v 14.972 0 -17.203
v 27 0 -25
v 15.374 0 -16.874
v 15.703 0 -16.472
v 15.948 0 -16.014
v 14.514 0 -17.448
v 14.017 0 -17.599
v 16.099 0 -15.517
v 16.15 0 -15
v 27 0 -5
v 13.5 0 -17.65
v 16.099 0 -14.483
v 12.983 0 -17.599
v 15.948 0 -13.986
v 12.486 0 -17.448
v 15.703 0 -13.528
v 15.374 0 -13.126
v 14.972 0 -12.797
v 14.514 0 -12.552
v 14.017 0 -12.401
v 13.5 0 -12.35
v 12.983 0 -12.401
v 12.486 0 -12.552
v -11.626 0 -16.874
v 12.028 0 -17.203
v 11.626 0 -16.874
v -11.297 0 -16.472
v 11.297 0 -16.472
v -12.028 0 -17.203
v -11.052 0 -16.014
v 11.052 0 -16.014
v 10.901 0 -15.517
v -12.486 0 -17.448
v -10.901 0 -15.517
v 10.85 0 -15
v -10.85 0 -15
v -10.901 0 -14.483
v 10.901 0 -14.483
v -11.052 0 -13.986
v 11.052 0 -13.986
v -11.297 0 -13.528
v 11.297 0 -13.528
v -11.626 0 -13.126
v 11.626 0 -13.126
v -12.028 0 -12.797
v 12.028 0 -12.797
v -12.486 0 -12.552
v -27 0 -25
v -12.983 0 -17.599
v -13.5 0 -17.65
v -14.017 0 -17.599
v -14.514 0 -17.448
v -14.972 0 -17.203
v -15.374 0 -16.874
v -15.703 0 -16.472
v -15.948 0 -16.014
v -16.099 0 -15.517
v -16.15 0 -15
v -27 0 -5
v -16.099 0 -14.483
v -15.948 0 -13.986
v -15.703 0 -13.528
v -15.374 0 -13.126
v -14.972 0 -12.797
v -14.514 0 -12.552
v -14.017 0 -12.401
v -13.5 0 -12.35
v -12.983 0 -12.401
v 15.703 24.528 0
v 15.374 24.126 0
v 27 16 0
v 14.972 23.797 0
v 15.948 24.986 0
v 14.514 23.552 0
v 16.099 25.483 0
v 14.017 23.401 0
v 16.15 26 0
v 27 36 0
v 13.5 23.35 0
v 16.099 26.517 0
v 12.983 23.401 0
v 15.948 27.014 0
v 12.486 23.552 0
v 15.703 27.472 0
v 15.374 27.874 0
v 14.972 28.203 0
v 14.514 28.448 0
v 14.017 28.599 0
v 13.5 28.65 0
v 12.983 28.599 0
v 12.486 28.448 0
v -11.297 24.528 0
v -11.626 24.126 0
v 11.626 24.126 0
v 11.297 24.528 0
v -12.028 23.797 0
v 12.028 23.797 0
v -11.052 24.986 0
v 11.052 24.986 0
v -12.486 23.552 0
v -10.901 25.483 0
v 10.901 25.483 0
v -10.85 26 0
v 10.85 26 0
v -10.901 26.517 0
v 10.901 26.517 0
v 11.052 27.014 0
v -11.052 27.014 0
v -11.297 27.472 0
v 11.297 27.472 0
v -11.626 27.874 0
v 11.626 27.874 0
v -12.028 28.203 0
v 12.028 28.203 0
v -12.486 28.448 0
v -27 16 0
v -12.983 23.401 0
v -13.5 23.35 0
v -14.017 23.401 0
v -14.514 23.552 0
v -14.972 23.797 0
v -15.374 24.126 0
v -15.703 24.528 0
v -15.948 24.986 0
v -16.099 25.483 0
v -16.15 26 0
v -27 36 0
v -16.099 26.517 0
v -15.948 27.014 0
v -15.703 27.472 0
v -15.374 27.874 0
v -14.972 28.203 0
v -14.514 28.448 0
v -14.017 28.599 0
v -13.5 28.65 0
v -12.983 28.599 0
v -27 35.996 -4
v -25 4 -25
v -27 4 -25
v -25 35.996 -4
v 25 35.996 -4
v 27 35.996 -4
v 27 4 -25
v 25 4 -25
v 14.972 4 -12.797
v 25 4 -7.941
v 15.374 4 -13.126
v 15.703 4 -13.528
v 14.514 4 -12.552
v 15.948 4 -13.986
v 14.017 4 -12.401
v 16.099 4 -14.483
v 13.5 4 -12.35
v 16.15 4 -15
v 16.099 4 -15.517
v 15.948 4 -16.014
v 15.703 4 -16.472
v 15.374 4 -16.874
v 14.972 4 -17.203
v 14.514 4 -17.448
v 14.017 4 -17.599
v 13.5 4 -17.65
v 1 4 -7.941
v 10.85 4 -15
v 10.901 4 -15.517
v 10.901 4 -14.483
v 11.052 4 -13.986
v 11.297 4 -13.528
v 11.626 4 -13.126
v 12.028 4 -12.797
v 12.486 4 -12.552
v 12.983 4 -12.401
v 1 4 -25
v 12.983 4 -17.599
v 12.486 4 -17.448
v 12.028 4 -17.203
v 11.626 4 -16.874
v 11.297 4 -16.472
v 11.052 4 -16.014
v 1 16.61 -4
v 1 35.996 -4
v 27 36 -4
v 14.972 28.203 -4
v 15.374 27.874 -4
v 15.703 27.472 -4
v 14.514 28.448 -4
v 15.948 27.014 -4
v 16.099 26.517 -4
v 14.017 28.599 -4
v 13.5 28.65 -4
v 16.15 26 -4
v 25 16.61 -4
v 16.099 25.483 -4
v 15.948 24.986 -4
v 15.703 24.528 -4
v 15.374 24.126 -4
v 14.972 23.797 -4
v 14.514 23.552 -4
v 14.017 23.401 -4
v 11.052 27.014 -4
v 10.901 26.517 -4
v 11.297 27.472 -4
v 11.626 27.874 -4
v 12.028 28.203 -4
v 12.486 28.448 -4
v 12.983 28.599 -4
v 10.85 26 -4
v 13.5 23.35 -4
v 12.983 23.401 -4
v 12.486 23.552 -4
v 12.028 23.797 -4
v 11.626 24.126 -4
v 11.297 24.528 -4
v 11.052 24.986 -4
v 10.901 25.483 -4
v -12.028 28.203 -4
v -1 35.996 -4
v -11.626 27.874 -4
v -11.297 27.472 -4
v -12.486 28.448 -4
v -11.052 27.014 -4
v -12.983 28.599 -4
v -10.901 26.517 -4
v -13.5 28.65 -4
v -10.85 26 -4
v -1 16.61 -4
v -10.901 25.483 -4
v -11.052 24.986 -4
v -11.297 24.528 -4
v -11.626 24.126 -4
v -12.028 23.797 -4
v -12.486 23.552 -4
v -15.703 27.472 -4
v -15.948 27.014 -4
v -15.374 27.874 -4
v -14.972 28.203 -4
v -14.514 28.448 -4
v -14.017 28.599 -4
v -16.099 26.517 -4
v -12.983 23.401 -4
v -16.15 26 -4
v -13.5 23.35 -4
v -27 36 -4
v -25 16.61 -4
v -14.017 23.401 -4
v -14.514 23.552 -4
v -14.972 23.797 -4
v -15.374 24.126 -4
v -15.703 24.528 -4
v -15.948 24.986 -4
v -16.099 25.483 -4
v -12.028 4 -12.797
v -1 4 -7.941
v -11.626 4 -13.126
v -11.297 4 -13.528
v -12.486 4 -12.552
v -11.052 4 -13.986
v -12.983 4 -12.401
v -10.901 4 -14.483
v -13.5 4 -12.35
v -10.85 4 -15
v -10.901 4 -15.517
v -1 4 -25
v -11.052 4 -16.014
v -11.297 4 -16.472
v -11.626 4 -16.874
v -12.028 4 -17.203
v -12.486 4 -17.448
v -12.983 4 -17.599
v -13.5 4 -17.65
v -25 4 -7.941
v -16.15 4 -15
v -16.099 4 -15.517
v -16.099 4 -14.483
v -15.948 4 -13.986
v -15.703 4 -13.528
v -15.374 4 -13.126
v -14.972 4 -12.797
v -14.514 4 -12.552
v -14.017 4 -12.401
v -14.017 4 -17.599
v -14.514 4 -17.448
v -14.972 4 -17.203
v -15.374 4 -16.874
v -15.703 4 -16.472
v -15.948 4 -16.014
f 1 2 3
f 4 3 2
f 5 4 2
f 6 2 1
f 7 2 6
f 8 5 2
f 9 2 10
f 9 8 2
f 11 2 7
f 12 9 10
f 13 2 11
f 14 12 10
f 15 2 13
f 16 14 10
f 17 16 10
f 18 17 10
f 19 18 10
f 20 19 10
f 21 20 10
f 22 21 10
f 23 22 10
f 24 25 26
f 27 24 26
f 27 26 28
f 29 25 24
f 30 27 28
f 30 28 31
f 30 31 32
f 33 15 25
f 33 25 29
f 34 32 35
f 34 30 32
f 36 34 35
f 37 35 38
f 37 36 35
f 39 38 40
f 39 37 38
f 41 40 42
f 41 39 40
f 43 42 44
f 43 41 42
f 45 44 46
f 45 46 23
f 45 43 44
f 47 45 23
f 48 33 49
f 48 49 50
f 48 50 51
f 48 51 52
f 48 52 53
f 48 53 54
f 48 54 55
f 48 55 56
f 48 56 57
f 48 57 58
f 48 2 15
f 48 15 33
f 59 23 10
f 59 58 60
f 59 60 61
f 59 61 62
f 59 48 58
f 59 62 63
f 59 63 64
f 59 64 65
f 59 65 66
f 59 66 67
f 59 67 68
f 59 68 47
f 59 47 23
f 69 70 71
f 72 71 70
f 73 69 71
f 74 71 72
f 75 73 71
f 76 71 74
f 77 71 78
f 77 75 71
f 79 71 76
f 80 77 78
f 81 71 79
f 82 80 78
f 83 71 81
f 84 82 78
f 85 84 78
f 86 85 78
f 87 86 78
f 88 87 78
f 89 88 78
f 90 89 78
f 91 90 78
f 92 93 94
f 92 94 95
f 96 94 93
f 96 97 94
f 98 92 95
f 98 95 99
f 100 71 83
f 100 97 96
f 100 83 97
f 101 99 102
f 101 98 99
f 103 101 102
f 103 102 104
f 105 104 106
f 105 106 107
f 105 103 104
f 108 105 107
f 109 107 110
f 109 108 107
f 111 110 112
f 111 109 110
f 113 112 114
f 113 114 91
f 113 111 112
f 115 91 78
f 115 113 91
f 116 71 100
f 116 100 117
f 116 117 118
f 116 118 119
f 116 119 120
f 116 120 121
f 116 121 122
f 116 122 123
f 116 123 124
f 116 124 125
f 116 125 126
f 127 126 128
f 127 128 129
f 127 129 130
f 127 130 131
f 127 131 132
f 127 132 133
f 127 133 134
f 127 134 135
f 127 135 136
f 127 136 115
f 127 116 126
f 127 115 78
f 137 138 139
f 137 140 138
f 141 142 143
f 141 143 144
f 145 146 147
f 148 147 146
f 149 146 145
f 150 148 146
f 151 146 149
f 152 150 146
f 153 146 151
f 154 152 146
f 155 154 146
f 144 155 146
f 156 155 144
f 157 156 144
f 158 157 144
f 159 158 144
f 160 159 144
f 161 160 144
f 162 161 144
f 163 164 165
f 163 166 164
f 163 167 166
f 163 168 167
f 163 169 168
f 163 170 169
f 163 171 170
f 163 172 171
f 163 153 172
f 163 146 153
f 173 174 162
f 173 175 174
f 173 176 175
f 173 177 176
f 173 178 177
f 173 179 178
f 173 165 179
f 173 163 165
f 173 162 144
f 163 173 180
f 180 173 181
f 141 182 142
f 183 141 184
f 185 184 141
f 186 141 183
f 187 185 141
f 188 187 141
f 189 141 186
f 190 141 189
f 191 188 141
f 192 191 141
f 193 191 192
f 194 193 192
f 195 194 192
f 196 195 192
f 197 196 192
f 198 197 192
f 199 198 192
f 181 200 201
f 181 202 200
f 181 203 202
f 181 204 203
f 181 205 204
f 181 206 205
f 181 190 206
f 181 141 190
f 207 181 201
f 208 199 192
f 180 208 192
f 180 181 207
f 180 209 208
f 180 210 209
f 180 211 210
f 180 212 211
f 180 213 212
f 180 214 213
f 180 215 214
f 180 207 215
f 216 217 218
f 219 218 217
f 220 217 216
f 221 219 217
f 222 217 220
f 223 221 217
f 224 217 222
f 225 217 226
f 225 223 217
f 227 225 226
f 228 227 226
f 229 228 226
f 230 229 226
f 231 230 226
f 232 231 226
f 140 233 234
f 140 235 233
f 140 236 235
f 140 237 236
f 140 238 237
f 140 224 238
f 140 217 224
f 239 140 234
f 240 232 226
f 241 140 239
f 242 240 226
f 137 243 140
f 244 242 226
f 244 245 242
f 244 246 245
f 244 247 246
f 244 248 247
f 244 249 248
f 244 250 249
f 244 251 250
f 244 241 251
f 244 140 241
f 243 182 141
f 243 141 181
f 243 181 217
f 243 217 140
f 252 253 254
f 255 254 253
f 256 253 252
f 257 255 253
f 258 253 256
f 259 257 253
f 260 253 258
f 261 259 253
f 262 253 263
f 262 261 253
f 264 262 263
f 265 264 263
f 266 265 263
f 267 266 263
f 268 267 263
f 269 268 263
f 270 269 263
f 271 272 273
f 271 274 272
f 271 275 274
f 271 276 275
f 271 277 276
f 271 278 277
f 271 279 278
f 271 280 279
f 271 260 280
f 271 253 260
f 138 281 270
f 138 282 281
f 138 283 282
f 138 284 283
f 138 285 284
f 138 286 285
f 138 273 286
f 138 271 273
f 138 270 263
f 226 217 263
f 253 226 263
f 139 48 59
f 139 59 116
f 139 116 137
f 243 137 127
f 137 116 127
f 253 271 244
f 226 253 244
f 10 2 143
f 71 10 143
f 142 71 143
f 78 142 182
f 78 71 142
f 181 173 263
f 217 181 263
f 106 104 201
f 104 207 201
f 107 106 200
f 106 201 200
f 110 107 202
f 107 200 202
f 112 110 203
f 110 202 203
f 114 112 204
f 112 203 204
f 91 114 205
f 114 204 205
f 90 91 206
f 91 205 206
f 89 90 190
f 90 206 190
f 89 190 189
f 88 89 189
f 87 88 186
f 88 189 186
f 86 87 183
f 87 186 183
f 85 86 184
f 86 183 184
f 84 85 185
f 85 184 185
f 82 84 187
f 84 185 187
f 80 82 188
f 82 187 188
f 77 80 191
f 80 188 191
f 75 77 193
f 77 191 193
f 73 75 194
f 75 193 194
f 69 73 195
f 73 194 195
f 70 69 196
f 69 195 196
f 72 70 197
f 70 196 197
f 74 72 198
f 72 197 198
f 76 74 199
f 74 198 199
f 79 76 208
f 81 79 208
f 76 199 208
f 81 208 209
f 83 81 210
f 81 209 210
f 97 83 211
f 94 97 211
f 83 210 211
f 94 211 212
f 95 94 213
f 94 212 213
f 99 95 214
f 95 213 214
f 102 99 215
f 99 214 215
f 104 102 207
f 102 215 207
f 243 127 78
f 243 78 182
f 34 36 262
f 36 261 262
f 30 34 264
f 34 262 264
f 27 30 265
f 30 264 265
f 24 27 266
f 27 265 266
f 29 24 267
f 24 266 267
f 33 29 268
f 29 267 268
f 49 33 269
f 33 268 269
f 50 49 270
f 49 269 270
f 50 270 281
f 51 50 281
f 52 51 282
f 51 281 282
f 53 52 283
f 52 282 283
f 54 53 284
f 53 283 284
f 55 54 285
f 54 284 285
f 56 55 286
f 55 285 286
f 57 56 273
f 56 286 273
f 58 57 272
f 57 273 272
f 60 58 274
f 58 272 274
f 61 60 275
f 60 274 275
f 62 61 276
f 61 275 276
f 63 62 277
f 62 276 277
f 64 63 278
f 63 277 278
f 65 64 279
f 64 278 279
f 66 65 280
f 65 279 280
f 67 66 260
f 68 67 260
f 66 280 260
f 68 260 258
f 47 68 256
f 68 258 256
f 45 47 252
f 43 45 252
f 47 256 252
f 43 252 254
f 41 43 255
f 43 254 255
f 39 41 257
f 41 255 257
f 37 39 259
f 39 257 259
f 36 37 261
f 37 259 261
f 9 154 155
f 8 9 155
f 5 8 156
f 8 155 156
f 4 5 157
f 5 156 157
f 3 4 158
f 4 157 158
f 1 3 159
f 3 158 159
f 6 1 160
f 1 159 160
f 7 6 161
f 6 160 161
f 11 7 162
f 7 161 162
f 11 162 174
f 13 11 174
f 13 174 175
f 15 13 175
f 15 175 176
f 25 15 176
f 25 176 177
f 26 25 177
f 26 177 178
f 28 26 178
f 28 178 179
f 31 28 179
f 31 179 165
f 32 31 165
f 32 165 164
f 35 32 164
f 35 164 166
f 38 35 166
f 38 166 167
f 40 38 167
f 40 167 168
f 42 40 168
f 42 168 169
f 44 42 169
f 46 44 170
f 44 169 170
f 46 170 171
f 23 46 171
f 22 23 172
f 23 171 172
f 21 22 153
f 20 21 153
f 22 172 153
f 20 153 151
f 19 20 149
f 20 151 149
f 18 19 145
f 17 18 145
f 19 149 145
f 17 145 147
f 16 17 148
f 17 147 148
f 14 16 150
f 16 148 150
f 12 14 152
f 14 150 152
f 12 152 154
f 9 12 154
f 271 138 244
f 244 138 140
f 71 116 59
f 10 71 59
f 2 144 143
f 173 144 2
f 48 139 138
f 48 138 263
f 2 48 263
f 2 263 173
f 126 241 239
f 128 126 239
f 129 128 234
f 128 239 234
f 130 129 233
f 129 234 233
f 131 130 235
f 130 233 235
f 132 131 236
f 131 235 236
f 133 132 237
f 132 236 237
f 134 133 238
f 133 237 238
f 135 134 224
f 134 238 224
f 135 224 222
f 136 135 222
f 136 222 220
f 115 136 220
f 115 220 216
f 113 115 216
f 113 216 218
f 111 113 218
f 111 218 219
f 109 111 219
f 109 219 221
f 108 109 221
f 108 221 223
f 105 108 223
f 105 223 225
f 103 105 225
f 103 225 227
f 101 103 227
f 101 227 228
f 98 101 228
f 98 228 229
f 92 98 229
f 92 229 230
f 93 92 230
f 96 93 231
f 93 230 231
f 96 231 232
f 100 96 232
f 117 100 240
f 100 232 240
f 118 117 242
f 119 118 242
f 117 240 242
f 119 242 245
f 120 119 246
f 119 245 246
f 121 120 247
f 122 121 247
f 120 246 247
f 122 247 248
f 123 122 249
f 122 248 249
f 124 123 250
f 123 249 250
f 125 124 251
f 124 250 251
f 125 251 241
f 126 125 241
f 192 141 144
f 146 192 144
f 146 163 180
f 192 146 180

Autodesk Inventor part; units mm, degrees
ref_plane "YZ Plane" through (0, 0, 0) normal (1, 0, 0) x (0, 1, 0)
ref_plane "XZ Plane" through (0, 0, 0) normal (0, 1, 0) x (-1, 0, 0)
sketch "Sketch7" plane through (0, 0, 0) normal (1, 0, 0) x (0, 1, 0)
  line L0 (36, 0) -> (36, -4)
  line L1 (36, -4) -> (4, -25)
  line L2 (4, -25) -> (0, -25)
  line L3 (0, -25) -> (0, 0)
  line L4 (0, 0) -> (36, 0)
  line L5 (36, -4) -> (16.6104, -4)
  line L6 (4, -7.9408) -> (4, -25)
  line L7 (16, 0) -> (0, -5)
  line L8 (4, -7.9408) -> (16.6104, -4)
  dimension "d35" = 4
  dimension "d36" = 25
  dimension "d37" = 36
  dimension "d43" = 4
  dimension "d44" = 20
  dimension "d45" = 20
extrude "Extrusion6" add sketch "Sketch7" along normal mid plane 54 contours L0 L5 L8 L6 L2 L3 L7 L4
sketch "Sketch8" plane through (27, 36, -4) normal (0, 0, -1) x (-1, 0, 0)
  line L0 (0, -10) -> (13.5, -10) construction
  line L1 (13.5, -10) -> (27, -10) construction
  line L2 (27, -10) -> (40.5, -10) construction
  line L3 (40.5, -10) -> (54, -10) construction
  circle A0 centre (13.5, -10) radius 2.65
  circle A1 centre (40.5, -10) radius 2.65
  line L4 (0, -19.3896) -> (0, 0) projected
  line L5 (54, 0) -> (54, -19.3896) projected
  line L6 (54, 0) -> (0, 0) projected
  point P0 (27, -36)
  dimension "d46" = 5.3
  dimension "d55" = 10
extrude "Extrusion7" cut sketch "Sketch8" against normal through all
sketch "Sketch9" plane through (-27, 4, -7.9408) normal (0, 1, 0) x (1, 0, 0)
  line L0 (54, 17.0592) -> (54, 0) projected
  line L1 (54, 7.0592) -> (40.5, 7.0592) construction
  line L2 (40.5, 7.0592) -> (27, 7.0592) construction
  line L3 (27, 7.0592) -> (13.5, 7.0592) construction
  line L4 (13.5, 7.0592) -> (0, 7.0592) construction
  line L5 (0, 0) -> (0, 17.0592) projected
  circle A0 centre (40.5, 7.0592) radius 2.65
  circle A1 centre (13.5, 7.0592) radius 2.65
  line L6 (54, 17.0592) -> (0, 17.0592) projected
  point P0 (27, -7.9408)
  dimension "d49" = 5.3
  dimension "d56" = 10
  dimension "d57" = 27
extrude "Extrusion8" cut sketch "Sketch9" against normal blind 10
ref_plane "Work Plane4" through (0, 4, -25) normal (0, 0.5487, -0.836) x (-1, 0, 0)
sketch "Sketch10" plane through (0, 4, -25) normal (0, 0.5487, -0.836) x (-1, 0, 0)
  line L0 (-27, 38.2753) -> (-25, 38.2753)
  line L1 (-25, 38.2753) -> (-25, 0)
  line L2 (-25, 0) -> (-27, 0)
  line L3 (-27, 0) -> (-27, 38.2753)
  line L4 (27, 0) -> (25, 0)
  line L5 (25, 0) -> (25, 38.2753)
  line L6 (25, 38.2753) -> (27, 38.2753)
  line L7 (27, 38.2753) -> (27, 0)
  line L8 (-1, 38.2753) -> (1, 38.2753)
  line L9 (1, 38.2753) -> (1, 0)
  line L10 (1, 0) -> (-1, 0)
  line L11 (-1, 0) -> (-1, 38.2753)
  line L12 (27, 38.2753) -> (-27, 38.2753) projected
  line L13 (-27, 0) -> (27, 0) projected
  point P0 (0, 10.3722)
  point P1 (0, 38.2753)
  dimension "d52" = 2
extrude "Extrusion9" add sketch "Sketch10" against normal up to next contours L0 L1 L2 L3 | L8 L9 L10 L11 | L6 L7 L4 L5
equation "\"BendRadius\" = Thickness"
equation "\"BendReliefWidth\" = Thickness"
equation "\"BendReliefDepth\" = 0.5 * Thickness"
equation "\"CornerReliefSize\" = 4 * Thickness"
equation "\"MinimumRemnant\" = 2 * Thickness"
equation "\"TransitionRadius\" = BendRadius"
equation "\"JacobiRadiusSize\" = Thickness"
equation "\"GapSize\" = Thickness"
equation "\"Thickness\" = 0.5"
properties part number "Soporte Cajas" material "Rubber"
